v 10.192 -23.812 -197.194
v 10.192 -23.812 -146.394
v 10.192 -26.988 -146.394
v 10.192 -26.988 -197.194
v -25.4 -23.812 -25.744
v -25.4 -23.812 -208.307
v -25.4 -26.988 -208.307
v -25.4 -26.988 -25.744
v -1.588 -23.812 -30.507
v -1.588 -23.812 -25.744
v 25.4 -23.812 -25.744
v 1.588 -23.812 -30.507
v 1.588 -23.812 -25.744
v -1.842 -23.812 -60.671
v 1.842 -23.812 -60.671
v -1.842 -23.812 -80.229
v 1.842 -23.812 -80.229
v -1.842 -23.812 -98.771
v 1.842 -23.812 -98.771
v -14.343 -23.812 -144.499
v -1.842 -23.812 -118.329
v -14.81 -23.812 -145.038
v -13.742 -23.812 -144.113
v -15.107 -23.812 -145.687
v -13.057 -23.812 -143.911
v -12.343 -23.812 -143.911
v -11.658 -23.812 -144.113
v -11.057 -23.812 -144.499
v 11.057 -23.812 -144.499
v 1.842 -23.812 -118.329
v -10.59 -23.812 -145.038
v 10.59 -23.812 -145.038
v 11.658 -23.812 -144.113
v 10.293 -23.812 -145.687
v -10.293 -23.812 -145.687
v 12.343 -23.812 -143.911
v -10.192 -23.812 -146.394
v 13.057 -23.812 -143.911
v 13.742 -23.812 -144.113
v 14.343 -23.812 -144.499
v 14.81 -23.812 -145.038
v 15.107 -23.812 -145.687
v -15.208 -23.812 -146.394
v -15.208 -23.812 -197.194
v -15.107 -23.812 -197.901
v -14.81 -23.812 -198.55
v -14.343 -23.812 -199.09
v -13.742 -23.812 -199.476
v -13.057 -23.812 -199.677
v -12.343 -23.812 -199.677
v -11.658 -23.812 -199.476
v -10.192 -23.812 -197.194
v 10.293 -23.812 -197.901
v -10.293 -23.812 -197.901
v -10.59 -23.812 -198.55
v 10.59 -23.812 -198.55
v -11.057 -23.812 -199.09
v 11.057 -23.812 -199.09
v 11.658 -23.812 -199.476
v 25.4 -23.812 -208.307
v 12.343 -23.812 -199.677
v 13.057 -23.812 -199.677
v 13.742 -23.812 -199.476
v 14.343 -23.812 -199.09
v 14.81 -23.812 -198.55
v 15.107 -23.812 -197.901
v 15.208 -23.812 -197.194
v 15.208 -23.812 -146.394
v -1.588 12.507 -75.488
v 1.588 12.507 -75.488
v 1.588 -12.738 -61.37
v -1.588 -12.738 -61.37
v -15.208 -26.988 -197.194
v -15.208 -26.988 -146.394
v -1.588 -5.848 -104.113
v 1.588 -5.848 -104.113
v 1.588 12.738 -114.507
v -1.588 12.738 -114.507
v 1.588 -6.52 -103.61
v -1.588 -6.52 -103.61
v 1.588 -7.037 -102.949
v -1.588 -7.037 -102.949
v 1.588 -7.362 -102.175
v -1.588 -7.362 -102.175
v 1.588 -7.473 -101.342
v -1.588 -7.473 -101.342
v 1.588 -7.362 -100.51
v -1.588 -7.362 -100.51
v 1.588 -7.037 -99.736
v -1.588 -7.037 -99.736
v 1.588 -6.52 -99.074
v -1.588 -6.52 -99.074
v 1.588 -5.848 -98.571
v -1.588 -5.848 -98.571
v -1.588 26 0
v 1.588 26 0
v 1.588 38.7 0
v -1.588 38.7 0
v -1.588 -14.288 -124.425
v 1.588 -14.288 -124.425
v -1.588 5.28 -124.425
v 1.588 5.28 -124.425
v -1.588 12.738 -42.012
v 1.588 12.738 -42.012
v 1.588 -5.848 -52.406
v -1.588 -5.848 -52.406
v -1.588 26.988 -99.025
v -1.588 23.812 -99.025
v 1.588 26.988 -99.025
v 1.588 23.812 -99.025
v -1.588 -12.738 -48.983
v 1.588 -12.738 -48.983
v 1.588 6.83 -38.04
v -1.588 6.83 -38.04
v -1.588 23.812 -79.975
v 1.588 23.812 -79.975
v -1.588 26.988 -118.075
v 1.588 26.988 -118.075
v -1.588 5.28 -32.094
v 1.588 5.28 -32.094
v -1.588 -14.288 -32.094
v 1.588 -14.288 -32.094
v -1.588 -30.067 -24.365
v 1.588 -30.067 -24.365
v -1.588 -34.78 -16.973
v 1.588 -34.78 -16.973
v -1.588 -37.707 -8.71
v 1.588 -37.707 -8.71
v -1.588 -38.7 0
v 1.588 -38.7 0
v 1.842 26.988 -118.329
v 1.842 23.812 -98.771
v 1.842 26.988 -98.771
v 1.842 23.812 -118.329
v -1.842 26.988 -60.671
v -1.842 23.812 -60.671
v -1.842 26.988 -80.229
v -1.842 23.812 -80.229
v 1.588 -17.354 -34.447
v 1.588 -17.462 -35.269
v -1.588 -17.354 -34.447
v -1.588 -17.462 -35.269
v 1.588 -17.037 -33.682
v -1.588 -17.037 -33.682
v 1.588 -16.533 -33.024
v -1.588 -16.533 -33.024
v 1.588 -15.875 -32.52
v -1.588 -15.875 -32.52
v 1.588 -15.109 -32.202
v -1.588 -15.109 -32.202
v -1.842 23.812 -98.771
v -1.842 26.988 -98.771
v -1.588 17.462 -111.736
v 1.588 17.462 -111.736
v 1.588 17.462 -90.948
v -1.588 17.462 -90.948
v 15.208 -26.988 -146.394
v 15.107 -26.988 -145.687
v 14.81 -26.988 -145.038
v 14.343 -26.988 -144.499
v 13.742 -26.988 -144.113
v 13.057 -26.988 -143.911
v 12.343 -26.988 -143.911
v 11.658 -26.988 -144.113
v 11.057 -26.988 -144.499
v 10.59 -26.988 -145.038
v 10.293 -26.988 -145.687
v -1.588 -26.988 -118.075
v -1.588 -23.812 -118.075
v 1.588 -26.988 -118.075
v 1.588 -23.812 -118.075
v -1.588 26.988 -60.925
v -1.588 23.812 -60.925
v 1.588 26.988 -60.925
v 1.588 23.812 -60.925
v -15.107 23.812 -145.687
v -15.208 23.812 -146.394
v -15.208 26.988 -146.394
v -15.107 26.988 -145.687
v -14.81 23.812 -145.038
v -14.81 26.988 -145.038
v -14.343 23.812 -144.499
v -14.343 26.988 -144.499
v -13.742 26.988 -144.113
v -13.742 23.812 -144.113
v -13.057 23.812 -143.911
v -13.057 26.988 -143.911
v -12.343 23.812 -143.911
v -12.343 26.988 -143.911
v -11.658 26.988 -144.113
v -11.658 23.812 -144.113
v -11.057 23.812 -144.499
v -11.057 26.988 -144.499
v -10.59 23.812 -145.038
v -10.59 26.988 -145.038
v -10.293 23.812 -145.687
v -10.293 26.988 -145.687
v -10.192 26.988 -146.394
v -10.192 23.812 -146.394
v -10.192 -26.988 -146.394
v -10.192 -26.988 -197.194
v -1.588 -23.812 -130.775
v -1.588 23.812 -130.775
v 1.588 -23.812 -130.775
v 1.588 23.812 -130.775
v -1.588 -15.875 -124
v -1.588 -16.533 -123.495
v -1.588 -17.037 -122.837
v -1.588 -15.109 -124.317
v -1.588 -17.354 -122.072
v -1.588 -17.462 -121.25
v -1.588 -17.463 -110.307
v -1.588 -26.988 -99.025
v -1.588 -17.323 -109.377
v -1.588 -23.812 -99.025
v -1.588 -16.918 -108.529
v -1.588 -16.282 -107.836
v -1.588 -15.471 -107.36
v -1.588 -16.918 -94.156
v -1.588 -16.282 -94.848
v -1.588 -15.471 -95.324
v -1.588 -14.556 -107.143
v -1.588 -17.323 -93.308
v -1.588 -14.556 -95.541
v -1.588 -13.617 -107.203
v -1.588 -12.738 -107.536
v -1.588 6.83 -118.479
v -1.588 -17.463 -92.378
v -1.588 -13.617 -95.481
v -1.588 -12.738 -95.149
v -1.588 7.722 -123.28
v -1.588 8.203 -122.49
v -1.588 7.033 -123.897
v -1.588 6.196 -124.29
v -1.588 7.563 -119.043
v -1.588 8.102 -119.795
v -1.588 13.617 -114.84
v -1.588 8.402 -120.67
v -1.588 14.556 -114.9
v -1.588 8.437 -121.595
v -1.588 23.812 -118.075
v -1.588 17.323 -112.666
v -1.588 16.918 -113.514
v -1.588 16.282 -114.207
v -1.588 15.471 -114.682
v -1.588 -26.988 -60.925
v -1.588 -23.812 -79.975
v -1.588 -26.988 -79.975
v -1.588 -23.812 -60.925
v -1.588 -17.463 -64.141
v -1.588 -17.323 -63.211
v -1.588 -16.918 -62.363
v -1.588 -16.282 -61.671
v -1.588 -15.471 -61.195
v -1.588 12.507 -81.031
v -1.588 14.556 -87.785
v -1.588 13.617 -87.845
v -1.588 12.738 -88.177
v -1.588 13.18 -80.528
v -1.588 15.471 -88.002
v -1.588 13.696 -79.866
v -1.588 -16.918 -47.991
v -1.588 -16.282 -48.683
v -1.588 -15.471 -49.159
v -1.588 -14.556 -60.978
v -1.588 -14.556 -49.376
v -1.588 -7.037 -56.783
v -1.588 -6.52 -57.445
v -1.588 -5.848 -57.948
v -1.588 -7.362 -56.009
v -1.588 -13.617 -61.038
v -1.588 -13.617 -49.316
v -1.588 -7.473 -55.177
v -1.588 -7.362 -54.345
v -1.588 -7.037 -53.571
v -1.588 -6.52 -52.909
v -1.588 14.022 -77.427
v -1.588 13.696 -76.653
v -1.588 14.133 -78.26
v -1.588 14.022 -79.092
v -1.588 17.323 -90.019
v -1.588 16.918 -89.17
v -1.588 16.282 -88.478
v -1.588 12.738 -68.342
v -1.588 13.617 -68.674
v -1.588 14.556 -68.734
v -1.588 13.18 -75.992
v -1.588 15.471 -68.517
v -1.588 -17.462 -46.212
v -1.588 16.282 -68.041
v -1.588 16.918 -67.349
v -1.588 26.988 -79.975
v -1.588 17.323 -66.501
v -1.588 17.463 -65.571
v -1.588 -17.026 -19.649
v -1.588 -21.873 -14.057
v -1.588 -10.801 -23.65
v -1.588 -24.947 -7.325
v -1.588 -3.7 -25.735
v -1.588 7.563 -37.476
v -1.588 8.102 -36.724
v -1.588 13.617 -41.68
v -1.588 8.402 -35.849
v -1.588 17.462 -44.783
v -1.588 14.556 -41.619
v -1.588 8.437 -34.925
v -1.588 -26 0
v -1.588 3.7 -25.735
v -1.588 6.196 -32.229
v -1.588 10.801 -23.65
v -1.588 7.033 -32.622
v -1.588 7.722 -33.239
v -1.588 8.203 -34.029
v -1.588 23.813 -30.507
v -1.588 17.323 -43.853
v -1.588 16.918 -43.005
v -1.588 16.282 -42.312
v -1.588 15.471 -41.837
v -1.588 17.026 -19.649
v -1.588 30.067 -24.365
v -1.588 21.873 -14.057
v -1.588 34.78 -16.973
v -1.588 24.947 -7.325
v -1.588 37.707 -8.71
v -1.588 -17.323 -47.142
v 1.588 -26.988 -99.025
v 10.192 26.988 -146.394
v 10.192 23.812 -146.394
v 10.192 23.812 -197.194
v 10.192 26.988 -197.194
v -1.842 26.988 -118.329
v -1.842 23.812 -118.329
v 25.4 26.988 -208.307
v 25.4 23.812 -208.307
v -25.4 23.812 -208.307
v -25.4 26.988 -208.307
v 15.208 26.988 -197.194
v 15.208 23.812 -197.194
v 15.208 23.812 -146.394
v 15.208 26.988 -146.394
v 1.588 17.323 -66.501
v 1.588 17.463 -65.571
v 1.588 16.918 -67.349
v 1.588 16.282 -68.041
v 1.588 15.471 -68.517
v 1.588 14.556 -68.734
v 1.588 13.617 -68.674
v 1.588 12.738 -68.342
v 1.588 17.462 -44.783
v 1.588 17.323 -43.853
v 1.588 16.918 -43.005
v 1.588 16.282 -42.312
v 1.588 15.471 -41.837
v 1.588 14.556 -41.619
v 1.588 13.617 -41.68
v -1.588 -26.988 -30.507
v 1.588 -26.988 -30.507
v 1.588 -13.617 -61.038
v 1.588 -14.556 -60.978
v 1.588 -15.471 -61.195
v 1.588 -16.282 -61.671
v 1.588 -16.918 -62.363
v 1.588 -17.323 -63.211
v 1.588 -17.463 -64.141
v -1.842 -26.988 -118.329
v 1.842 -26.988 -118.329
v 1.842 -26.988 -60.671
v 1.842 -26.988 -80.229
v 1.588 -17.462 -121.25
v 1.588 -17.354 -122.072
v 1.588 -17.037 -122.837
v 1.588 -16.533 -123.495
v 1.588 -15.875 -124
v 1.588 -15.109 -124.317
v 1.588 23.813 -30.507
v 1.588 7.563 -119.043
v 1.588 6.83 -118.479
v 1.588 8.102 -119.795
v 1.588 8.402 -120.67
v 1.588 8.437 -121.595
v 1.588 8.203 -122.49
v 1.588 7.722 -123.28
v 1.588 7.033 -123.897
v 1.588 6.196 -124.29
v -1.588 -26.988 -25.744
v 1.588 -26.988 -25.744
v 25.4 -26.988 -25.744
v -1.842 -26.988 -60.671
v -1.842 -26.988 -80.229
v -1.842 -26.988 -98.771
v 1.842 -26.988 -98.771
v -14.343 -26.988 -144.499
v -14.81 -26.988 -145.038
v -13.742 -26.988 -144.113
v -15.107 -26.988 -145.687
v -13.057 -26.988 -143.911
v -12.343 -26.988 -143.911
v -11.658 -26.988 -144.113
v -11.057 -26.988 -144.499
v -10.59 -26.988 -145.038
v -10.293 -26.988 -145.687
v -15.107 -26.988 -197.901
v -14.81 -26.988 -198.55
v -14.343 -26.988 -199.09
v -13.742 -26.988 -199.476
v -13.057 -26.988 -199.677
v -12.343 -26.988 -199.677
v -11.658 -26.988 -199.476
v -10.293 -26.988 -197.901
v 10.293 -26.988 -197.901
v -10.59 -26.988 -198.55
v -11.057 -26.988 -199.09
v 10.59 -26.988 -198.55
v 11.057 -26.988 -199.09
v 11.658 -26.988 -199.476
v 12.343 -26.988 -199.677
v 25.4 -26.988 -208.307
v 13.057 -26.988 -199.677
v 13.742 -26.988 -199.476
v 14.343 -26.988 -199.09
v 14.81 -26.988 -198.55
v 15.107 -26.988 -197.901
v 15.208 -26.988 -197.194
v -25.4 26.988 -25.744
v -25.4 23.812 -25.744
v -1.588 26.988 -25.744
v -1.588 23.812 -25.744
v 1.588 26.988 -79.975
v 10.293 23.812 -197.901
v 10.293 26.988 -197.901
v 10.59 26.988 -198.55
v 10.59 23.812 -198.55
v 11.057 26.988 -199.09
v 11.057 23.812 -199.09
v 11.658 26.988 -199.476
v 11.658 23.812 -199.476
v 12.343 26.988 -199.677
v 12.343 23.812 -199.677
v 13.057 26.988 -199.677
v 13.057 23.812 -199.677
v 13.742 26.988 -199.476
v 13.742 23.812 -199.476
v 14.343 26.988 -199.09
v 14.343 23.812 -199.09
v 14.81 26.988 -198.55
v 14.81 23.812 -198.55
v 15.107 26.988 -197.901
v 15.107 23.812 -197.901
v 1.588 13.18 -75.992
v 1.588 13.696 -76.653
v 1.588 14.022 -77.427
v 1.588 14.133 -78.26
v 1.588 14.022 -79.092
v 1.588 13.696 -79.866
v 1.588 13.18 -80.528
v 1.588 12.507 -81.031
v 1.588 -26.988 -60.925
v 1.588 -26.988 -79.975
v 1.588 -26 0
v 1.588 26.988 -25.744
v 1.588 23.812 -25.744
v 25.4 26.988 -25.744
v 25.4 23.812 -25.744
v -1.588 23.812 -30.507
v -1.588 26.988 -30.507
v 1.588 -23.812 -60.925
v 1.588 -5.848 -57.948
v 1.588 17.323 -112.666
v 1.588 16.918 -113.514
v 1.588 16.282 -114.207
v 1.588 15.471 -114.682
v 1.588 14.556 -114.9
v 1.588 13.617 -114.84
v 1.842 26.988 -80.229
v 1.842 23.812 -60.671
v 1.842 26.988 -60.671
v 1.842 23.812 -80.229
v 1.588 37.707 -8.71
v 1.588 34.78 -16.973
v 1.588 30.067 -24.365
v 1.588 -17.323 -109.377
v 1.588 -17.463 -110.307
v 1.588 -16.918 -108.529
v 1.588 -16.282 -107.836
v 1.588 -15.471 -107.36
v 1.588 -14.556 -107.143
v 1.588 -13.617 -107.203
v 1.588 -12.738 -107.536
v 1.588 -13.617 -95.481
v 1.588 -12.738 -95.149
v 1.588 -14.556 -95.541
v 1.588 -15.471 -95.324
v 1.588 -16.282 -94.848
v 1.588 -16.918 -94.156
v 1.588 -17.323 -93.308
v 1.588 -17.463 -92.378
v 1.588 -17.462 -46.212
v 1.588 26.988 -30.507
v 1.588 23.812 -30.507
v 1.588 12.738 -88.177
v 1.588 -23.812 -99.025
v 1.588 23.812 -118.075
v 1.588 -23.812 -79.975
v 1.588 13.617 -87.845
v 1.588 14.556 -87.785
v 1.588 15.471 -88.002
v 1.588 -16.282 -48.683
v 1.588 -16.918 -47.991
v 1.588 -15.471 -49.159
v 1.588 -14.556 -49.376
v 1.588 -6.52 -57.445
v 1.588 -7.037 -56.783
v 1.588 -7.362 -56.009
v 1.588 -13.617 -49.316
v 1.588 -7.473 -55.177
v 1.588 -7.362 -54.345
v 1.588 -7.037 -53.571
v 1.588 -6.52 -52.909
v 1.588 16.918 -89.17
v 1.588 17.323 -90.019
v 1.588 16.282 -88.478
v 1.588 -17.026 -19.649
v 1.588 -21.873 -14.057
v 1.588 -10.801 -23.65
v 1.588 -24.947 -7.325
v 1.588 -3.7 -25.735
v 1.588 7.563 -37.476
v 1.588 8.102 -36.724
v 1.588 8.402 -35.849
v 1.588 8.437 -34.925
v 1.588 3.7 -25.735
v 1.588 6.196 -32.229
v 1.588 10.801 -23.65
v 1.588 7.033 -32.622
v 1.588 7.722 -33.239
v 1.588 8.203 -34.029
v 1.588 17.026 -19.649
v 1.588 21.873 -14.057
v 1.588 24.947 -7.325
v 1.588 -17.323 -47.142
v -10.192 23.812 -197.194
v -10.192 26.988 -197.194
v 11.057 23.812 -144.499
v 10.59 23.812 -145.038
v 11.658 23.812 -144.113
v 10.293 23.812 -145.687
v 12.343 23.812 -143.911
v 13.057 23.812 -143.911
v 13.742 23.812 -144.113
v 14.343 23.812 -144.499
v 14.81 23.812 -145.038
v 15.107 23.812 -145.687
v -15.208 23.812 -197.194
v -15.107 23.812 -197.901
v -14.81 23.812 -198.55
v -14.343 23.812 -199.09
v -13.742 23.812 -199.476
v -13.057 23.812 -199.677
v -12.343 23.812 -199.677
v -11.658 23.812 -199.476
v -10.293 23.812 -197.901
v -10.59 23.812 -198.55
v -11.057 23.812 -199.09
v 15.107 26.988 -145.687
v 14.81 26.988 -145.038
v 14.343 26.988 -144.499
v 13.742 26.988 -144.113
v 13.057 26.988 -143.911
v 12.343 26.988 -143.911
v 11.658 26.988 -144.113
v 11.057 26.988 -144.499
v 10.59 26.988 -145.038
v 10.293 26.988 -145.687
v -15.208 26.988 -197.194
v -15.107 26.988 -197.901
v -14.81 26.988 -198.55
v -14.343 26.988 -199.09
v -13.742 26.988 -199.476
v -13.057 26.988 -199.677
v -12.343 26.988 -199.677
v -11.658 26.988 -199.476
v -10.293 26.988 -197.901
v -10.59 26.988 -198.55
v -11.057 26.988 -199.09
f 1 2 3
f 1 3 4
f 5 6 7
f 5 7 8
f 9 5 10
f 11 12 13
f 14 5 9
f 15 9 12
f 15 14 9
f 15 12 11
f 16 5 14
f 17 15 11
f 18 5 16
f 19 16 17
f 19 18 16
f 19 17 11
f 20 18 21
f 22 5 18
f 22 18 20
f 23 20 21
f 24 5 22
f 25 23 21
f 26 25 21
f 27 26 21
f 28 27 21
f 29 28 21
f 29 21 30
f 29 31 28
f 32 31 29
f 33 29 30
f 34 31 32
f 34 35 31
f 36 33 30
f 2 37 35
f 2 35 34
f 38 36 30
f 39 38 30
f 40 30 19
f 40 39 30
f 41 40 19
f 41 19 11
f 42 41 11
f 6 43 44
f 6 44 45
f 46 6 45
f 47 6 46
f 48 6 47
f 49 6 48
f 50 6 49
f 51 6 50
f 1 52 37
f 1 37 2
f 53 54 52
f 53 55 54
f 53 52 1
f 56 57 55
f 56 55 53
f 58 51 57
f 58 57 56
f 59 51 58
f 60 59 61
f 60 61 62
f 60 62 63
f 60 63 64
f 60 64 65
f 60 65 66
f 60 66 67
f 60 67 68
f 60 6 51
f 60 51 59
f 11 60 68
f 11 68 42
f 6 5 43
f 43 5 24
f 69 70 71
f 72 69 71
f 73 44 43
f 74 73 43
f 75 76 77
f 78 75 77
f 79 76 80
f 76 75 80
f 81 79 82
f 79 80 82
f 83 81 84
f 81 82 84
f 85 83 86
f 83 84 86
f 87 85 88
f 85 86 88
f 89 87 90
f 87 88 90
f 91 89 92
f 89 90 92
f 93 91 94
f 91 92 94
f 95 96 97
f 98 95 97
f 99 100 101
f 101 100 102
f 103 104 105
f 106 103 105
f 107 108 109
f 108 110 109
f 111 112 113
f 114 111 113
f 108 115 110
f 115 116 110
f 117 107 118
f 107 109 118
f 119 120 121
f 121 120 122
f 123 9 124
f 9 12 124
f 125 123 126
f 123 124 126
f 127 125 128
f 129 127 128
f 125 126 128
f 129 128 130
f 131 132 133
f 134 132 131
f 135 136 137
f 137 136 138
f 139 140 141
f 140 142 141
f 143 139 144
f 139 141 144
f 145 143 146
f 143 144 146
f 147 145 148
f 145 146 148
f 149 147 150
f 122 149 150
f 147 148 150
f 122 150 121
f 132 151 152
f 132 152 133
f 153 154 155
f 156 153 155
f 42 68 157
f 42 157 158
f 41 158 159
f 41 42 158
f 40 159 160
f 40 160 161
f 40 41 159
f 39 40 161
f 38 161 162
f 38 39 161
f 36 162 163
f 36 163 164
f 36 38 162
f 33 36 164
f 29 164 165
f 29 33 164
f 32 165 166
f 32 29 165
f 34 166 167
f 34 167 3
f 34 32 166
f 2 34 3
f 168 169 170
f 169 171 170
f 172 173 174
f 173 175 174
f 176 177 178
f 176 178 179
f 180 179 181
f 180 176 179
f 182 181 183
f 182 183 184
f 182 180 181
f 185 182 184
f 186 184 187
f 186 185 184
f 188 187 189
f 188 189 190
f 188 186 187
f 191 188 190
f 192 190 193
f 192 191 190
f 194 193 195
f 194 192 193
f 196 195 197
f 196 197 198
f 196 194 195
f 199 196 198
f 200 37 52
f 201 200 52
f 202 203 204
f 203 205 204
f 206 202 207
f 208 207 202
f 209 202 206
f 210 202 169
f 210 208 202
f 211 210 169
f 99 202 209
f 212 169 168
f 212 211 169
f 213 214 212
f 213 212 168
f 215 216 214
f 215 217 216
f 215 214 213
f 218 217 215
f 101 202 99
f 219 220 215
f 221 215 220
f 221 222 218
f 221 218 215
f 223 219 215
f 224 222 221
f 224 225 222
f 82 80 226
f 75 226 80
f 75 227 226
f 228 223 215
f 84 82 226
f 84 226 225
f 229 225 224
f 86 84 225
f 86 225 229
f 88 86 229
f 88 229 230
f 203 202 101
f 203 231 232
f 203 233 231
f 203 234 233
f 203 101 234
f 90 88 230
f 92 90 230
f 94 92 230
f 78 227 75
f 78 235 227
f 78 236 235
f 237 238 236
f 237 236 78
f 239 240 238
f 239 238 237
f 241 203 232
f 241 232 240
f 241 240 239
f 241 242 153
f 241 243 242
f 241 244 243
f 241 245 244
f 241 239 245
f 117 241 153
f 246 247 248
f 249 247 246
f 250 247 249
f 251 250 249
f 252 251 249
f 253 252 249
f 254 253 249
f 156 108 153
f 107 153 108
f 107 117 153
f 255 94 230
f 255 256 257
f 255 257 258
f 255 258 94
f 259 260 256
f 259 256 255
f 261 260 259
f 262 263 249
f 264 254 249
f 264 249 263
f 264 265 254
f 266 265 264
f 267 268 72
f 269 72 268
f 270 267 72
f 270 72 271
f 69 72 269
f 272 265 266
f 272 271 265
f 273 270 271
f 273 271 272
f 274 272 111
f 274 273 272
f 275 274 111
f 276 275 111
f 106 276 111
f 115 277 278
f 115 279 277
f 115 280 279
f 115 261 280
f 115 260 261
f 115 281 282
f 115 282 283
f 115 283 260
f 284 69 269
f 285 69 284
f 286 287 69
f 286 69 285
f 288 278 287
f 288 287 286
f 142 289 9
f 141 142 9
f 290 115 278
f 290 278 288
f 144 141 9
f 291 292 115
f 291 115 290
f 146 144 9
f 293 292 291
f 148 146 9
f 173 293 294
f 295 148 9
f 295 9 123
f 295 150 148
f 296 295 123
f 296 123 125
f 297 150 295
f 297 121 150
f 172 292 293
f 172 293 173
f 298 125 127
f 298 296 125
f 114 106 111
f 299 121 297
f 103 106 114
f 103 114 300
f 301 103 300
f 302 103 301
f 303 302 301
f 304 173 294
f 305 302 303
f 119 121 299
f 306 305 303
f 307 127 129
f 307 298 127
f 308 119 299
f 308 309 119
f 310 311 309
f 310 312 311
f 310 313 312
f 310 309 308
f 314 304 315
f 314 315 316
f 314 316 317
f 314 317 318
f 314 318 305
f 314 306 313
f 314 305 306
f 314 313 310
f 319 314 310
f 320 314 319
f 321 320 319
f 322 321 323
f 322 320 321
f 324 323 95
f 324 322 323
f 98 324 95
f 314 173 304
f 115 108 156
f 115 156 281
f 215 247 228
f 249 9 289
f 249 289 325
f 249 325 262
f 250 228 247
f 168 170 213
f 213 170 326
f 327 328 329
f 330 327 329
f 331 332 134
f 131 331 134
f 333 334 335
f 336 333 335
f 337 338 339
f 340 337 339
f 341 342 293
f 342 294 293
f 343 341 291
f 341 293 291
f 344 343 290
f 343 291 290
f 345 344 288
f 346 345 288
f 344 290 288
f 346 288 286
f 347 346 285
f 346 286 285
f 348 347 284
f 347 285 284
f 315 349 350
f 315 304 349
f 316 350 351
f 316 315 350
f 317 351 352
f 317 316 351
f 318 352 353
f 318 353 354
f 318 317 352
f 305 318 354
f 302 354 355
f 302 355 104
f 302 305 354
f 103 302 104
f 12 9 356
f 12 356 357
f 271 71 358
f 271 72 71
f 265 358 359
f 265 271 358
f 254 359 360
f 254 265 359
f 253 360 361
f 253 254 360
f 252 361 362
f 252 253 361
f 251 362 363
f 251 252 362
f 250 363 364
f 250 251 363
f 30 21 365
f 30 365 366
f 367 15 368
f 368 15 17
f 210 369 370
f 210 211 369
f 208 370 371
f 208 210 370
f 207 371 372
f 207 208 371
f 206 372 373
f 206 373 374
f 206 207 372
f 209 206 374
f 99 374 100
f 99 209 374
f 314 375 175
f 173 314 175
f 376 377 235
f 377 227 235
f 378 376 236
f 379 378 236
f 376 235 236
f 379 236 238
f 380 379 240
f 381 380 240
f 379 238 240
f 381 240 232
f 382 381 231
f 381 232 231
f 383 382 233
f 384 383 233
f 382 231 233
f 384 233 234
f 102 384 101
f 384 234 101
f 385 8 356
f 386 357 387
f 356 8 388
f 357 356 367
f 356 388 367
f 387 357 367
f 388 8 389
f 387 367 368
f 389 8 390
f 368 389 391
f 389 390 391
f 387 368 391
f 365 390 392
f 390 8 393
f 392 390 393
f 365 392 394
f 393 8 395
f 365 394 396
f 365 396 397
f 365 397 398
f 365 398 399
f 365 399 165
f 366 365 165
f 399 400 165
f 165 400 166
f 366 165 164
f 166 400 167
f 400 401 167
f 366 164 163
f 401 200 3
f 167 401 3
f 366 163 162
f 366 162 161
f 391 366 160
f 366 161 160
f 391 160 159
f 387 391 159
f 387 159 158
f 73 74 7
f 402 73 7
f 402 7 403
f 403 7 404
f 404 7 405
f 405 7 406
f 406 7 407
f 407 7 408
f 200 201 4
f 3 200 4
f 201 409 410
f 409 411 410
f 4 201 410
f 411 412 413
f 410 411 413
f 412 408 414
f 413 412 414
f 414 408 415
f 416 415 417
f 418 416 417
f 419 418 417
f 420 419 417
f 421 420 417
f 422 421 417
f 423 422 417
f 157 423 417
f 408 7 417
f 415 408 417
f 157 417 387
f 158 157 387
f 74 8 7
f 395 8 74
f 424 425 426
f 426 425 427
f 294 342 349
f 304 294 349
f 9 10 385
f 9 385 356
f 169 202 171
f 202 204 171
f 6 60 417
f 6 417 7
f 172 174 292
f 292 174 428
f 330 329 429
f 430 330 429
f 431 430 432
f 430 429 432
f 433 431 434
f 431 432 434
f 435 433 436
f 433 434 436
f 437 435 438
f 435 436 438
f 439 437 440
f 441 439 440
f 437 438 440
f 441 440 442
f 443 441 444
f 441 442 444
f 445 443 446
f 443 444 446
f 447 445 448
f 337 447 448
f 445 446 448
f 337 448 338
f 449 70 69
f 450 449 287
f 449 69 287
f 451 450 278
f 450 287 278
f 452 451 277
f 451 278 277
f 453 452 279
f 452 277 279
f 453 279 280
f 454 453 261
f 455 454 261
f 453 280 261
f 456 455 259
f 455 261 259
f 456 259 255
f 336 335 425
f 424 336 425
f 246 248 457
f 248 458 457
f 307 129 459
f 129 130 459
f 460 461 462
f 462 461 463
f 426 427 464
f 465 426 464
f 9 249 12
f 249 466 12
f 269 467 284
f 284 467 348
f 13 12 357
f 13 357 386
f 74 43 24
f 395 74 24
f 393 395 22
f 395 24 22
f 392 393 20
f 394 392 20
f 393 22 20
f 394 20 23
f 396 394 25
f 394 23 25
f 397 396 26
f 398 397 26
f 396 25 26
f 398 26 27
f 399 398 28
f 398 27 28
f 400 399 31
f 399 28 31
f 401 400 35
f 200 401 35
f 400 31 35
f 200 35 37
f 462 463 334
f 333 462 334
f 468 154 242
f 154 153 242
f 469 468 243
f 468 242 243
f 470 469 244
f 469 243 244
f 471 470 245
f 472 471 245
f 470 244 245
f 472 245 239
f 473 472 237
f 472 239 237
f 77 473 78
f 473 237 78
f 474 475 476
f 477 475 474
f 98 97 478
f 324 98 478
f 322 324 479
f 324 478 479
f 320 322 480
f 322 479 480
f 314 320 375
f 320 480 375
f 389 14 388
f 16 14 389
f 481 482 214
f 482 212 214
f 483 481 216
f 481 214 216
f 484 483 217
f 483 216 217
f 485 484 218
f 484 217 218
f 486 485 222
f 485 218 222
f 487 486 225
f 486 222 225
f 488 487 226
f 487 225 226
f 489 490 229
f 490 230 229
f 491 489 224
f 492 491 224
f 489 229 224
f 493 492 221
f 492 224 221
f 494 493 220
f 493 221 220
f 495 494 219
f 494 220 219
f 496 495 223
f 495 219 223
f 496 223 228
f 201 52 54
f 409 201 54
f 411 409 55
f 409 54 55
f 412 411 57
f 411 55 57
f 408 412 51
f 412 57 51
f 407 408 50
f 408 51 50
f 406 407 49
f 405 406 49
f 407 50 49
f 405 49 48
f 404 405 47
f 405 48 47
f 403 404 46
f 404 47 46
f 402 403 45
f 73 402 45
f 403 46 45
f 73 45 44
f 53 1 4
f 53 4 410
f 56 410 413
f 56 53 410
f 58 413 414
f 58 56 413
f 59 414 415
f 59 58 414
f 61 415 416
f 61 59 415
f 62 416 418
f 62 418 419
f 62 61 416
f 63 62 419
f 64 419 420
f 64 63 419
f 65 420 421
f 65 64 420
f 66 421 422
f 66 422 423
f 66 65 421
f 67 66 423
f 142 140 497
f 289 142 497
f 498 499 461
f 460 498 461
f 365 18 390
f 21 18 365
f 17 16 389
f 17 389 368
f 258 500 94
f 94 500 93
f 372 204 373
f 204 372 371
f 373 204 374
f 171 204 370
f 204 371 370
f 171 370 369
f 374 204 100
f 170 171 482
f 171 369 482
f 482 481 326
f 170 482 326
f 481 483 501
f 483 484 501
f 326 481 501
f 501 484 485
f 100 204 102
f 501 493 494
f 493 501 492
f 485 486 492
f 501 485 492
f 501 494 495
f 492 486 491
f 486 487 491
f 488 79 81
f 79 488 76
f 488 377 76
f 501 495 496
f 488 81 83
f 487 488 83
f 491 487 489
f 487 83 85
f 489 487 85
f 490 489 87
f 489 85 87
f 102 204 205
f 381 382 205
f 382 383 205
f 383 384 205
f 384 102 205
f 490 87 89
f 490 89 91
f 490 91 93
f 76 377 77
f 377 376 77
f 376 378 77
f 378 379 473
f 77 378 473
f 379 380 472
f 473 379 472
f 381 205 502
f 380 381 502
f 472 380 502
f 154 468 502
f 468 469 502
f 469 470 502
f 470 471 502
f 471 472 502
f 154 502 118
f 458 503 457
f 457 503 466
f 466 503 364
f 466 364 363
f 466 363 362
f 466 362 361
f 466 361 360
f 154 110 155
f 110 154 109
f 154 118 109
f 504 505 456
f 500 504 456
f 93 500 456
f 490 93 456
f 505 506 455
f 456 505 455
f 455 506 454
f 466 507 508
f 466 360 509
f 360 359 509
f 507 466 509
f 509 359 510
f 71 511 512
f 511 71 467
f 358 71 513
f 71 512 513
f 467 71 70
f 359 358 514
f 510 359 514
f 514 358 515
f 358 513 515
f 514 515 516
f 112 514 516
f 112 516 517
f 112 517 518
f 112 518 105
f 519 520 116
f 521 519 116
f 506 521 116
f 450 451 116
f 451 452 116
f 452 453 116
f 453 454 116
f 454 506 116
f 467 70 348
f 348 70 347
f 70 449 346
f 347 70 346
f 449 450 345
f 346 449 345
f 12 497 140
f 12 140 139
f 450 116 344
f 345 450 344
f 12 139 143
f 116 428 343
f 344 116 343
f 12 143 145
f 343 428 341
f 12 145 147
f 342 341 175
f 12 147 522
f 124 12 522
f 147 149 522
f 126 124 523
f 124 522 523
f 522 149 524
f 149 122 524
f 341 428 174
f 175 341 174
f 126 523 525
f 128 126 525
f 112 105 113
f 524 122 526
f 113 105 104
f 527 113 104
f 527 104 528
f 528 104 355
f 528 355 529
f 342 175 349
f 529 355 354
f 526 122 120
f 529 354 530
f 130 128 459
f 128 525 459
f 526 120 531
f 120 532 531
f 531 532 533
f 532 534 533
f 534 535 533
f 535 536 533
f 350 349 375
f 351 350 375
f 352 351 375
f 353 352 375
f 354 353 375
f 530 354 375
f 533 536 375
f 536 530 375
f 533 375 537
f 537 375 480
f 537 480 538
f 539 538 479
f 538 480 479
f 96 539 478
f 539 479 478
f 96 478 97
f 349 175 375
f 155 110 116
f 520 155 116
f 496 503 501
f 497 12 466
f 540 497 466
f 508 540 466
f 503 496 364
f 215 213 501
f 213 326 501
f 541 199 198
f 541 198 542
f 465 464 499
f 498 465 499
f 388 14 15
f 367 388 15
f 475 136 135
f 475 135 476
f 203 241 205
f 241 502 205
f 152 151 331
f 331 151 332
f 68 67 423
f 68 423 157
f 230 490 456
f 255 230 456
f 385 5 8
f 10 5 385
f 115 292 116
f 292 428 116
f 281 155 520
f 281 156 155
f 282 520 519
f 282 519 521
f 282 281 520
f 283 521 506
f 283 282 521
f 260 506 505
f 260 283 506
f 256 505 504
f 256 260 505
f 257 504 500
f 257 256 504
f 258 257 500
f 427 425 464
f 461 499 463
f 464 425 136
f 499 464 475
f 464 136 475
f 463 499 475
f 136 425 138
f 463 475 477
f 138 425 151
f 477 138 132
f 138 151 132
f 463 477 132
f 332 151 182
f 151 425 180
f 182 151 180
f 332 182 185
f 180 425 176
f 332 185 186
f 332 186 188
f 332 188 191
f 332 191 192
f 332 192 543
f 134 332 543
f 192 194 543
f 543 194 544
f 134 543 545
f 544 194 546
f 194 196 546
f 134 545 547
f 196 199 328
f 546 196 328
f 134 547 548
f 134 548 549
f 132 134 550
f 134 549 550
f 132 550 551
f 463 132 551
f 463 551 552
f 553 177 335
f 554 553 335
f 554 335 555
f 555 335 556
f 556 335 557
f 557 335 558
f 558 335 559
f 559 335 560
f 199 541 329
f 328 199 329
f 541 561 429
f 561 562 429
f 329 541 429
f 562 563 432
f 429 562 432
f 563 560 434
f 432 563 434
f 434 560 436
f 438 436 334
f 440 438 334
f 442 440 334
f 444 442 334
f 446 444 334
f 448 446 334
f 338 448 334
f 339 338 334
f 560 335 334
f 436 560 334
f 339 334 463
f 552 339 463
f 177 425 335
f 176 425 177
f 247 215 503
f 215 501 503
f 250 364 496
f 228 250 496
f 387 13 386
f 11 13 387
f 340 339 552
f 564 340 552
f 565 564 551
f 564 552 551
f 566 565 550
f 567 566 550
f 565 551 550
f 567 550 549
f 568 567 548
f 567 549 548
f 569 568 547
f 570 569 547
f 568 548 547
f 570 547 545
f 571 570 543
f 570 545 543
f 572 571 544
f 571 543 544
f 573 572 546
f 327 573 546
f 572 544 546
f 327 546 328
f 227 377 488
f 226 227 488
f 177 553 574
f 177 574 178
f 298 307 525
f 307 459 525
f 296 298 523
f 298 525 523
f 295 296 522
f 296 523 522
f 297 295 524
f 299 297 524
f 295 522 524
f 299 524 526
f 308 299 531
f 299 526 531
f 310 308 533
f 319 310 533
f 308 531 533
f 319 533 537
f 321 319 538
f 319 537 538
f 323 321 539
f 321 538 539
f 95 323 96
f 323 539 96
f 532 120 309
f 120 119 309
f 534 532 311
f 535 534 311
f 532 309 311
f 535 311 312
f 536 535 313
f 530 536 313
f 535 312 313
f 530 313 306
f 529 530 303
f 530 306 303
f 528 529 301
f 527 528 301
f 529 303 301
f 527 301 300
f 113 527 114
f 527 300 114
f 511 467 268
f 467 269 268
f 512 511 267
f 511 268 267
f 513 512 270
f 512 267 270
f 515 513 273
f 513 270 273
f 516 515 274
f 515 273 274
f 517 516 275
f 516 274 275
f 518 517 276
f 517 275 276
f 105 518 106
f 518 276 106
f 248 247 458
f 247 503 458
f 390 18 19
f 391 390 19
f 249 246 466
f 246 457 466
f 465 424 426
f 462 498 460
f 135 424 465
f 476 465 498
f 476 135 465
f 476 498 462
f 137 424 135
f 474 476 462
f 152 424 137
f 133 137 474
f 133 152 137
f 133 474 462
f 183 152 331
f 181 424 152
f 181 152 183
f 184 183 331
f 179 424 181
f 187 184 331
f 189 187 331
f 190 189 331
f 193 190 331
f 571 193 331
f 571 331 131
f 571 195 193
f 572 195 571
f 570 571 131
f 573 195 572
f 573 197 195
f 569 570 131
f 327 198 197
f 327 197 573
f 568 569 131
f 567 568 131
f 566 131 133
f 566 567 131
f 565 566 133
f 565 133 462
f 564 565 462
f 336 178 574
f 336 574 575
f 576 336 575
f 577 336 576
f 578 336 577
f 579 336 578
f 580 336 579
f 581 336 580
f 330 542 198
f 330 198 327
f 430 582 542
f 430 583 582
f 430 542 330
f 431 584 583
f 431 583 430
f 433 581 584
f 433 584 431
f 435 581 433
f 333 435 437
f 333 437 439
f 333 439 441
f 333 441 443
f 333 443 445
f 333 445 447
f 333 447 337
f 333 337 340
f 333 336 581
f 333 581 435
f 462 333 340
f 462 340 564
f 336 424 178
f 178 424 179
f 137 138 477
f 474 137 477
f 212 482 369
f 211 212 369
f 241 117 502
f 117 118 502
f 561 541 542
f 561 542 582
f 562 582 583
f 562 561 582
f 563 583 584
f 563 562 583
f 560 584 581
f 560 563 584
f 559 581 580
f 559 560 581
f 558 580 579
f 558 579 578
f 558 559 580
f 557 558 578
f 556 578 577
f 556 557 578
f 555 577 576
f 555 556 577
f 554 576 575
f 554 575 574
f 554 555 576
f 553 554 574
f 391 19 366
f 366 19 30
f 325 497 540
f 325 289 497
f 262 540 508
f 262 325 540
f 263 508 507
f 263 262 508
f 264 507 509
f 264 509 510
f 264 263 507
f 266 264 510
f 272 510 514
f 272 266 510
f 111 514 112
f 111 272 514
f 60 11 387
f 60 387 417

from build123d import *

# Parameters (mm, degrees)
BOSS_EXTRUDE1_DEPTH = 1.5875
SKETCH2_W           = 3.683
SKETCH2_H           = 19.558
BOSS_EXTRUDE2_DEPTH = 3.175
CUT_EXTRUDE1_DEPTH  = 27.9875
FILLET1_R           = 3.175


with BuildPart() as part:
    # Sketch1 → Boss-Extrude1 (new body, symmetric)
    with BuildSketch(Plane(origin=(0, 0, 0), x_dir=(0, 0, -1), z_dir=(1, 0, 0))):
        with BuildLine():
            Line((30.506636061, 23.8125), (60.925, 23.8125))
            Line((60.925, 23.8125), (60.925, 26.9875))
            Line((60.925, 26.9875), (79.975, 26.9875))
            Line((79.975, 26.9875), (79.975, 23.8125))
            Line((79.975, 23.8125), (99.025, 23.8125))
            Line((99.025, 23.8125), (99.025, 26.9875))
            Line((99.025, 26.9875), (118.075, 26.9875))
            Line((118.075, 26.9875), (118.075, 23.8125))
            Line((118.075, 23.8125), (130.775, 23.8125))
            Line((130.775, 23.8125), (130.775, -23.8125))
            Line((130.775, -23.8125), (118.075, -23.8125))
            Line((118.075, -23.8125), (118.075, -26.9875))
            Line((118.075, -26.9875), (99.025, -26.9875))
            Line((99.025, -26.9875), (99.025, -23.8125))
            Line((99.025, -23.8125), (79.975, -23.8125))
            Line((79.975, -23.8125), (79.975, -26.9875))
            Line((79.975, -26.9875), (60.925, -26.9875))
            Line((60.925, -26.9875), (60.925, -23.8125))
            Line((60.925, -23.8125), (30.506636061, -23.8125))
            ThreePointArc((30.506636061, -23.8125), (16.972717078, -34.779546791), (0, -38.7))
            Line((0, -38.7), (0, -26))
            ThreePointArc((0, -26), (26, 0), (0, 26))
            Line((0, 26), (0, 38.7))
            ThreePointArc((0, 38.7), (16.972717078, 34.779546791), (30.506636061, 23.8125))
        make_face()
    extrude(amount=BOSS_EXTRUDE1_DEPTH, both=True)

    # Sketch3 → Cut-Extrude1 (cut, through all)
    with BuildSketch(Plane(origin=(1.5875, 0, 0), x_dir=(0, 0, -1), z_dir=(1, 0, 0))):
        Polygon((32.094136061, -17.4625), (51.625664971, -17.4625), (32.094136061, 17.4625), align=None)
        Polygon((70.984031649, 17.4625), (39.369672442, 17.4625), (55.176852046, -10.802862644), align=None)
        Polygon((78.25956803, 17.4625), (58.72803912, -17.4625), (97.791096941, -17.4625), align=None)
        Polygon((117.149463618, 17.4625), (85.535104412, 17.4625), (101.342284015, -10.802862644), align=None)
        Polygon((104.89347109, -17.4625), (124.425, -17.4625), (124.425, 17.4625), align=None)
    extrude(amount=-CUT_EXTRUDE1_DEPTH, mode=Mode.SUBTRACT)

    # Fillet1
    fillet1_edges = [part.edges().sort_by_distance(p)[0] for p in [
        (0, -17.4625, -104.89347109),
        (0, 17.4625, -124.425),
        (0, -17.4625, -124.425),
        (0, -10.802862644, -101.342284015),
        (0, 17.4625, -85.535104412),
        (0, 17.4625, -117.149463618),
        (0, -17.4625, -32.094136061),
        (0, 17.4625, -32.094136061),
        (0, -17.4625, -51.625664971),
        (0, -17.4625, -58.72803912),
        (0, 17.4625, -78.25956803),
        (0, -17.4625, -97.791096941),
        (0, 17.4625, -39.369672442),
        (0, 17.4625, -70.984031649),
        (0, -10.802862644, -55.176852046),
    ]]
    fillet(fillet1_edges, radius=FILLET1_R)


with BuildPart() as body_2:
    # Sketch2 → Boss-Extrude2 (new body)
    with BuildSketch(Plane(origin=(0, 23.8125, 0), x_dir=(1, 0, 0), z_dir=(0, 1, 0))):
        Polygon((-1.5875, 30.506636061), (1.5875, 30.506636061), (1.5875, 25.744136061), (25.4, 25.744136061), (25.4, 208.306636061), (-25.4, 208.306636061), (-25.4, 25.744136061), (-1.5875, 25.744136061), align=None)
        with BuildLine():
            Line((10.19175, 146.394136061), (10.19175, 197.194136061))
            ThreePointArc((10.19175, 197.194136061), (12.7, 199.702386061), (15.20825, 197.194136061))
            Line((15.20825, 197.194136061), (15.20825, 146.394136061))
            ThreePointArc((15.20825, 146.394136061), (12.7, 143.885886061), (10.19175, 146.394136061))
        make_face(mode=Mode.SUBTRACT)
        with BuildLine():
            Line((-10.19175, 146.394136061), (-10.19175, 197.194136061))
            ThreePointArc((-10.19175, 197.194136061), (-12.7, 199.702386061), (-15.20825, 197.194136061))
            Line((-15.20825, 197.194136061), (-15.20825, 146.394136061))
            ThreePointArc((-15.20825, 146.394136061), (-12.7, 143.885886061), (-10.19175, 146.394136061))
        make_face(mode=Mode.SUBTRACT)
        with Locations((0, 108.55)):
            Rectangle(SKETCH2_W, SKETCH2_H, mode=Mode.SUBTRACT)
        with Locations((0, 70.45)):
            Rectangle(SKETCH2_W, SKETCH2_H, mode=Mode.SUBTRACT)
    extrude(amount=BOSS_EXTRUDE2_DEPTH)


with BuildPart() as body_3:
    # Mirror3: mirrored copy
    add(body_2.part.mirror(Plane.ZX))


solid = Compound([part.part, body_2.part, body_3.part])
